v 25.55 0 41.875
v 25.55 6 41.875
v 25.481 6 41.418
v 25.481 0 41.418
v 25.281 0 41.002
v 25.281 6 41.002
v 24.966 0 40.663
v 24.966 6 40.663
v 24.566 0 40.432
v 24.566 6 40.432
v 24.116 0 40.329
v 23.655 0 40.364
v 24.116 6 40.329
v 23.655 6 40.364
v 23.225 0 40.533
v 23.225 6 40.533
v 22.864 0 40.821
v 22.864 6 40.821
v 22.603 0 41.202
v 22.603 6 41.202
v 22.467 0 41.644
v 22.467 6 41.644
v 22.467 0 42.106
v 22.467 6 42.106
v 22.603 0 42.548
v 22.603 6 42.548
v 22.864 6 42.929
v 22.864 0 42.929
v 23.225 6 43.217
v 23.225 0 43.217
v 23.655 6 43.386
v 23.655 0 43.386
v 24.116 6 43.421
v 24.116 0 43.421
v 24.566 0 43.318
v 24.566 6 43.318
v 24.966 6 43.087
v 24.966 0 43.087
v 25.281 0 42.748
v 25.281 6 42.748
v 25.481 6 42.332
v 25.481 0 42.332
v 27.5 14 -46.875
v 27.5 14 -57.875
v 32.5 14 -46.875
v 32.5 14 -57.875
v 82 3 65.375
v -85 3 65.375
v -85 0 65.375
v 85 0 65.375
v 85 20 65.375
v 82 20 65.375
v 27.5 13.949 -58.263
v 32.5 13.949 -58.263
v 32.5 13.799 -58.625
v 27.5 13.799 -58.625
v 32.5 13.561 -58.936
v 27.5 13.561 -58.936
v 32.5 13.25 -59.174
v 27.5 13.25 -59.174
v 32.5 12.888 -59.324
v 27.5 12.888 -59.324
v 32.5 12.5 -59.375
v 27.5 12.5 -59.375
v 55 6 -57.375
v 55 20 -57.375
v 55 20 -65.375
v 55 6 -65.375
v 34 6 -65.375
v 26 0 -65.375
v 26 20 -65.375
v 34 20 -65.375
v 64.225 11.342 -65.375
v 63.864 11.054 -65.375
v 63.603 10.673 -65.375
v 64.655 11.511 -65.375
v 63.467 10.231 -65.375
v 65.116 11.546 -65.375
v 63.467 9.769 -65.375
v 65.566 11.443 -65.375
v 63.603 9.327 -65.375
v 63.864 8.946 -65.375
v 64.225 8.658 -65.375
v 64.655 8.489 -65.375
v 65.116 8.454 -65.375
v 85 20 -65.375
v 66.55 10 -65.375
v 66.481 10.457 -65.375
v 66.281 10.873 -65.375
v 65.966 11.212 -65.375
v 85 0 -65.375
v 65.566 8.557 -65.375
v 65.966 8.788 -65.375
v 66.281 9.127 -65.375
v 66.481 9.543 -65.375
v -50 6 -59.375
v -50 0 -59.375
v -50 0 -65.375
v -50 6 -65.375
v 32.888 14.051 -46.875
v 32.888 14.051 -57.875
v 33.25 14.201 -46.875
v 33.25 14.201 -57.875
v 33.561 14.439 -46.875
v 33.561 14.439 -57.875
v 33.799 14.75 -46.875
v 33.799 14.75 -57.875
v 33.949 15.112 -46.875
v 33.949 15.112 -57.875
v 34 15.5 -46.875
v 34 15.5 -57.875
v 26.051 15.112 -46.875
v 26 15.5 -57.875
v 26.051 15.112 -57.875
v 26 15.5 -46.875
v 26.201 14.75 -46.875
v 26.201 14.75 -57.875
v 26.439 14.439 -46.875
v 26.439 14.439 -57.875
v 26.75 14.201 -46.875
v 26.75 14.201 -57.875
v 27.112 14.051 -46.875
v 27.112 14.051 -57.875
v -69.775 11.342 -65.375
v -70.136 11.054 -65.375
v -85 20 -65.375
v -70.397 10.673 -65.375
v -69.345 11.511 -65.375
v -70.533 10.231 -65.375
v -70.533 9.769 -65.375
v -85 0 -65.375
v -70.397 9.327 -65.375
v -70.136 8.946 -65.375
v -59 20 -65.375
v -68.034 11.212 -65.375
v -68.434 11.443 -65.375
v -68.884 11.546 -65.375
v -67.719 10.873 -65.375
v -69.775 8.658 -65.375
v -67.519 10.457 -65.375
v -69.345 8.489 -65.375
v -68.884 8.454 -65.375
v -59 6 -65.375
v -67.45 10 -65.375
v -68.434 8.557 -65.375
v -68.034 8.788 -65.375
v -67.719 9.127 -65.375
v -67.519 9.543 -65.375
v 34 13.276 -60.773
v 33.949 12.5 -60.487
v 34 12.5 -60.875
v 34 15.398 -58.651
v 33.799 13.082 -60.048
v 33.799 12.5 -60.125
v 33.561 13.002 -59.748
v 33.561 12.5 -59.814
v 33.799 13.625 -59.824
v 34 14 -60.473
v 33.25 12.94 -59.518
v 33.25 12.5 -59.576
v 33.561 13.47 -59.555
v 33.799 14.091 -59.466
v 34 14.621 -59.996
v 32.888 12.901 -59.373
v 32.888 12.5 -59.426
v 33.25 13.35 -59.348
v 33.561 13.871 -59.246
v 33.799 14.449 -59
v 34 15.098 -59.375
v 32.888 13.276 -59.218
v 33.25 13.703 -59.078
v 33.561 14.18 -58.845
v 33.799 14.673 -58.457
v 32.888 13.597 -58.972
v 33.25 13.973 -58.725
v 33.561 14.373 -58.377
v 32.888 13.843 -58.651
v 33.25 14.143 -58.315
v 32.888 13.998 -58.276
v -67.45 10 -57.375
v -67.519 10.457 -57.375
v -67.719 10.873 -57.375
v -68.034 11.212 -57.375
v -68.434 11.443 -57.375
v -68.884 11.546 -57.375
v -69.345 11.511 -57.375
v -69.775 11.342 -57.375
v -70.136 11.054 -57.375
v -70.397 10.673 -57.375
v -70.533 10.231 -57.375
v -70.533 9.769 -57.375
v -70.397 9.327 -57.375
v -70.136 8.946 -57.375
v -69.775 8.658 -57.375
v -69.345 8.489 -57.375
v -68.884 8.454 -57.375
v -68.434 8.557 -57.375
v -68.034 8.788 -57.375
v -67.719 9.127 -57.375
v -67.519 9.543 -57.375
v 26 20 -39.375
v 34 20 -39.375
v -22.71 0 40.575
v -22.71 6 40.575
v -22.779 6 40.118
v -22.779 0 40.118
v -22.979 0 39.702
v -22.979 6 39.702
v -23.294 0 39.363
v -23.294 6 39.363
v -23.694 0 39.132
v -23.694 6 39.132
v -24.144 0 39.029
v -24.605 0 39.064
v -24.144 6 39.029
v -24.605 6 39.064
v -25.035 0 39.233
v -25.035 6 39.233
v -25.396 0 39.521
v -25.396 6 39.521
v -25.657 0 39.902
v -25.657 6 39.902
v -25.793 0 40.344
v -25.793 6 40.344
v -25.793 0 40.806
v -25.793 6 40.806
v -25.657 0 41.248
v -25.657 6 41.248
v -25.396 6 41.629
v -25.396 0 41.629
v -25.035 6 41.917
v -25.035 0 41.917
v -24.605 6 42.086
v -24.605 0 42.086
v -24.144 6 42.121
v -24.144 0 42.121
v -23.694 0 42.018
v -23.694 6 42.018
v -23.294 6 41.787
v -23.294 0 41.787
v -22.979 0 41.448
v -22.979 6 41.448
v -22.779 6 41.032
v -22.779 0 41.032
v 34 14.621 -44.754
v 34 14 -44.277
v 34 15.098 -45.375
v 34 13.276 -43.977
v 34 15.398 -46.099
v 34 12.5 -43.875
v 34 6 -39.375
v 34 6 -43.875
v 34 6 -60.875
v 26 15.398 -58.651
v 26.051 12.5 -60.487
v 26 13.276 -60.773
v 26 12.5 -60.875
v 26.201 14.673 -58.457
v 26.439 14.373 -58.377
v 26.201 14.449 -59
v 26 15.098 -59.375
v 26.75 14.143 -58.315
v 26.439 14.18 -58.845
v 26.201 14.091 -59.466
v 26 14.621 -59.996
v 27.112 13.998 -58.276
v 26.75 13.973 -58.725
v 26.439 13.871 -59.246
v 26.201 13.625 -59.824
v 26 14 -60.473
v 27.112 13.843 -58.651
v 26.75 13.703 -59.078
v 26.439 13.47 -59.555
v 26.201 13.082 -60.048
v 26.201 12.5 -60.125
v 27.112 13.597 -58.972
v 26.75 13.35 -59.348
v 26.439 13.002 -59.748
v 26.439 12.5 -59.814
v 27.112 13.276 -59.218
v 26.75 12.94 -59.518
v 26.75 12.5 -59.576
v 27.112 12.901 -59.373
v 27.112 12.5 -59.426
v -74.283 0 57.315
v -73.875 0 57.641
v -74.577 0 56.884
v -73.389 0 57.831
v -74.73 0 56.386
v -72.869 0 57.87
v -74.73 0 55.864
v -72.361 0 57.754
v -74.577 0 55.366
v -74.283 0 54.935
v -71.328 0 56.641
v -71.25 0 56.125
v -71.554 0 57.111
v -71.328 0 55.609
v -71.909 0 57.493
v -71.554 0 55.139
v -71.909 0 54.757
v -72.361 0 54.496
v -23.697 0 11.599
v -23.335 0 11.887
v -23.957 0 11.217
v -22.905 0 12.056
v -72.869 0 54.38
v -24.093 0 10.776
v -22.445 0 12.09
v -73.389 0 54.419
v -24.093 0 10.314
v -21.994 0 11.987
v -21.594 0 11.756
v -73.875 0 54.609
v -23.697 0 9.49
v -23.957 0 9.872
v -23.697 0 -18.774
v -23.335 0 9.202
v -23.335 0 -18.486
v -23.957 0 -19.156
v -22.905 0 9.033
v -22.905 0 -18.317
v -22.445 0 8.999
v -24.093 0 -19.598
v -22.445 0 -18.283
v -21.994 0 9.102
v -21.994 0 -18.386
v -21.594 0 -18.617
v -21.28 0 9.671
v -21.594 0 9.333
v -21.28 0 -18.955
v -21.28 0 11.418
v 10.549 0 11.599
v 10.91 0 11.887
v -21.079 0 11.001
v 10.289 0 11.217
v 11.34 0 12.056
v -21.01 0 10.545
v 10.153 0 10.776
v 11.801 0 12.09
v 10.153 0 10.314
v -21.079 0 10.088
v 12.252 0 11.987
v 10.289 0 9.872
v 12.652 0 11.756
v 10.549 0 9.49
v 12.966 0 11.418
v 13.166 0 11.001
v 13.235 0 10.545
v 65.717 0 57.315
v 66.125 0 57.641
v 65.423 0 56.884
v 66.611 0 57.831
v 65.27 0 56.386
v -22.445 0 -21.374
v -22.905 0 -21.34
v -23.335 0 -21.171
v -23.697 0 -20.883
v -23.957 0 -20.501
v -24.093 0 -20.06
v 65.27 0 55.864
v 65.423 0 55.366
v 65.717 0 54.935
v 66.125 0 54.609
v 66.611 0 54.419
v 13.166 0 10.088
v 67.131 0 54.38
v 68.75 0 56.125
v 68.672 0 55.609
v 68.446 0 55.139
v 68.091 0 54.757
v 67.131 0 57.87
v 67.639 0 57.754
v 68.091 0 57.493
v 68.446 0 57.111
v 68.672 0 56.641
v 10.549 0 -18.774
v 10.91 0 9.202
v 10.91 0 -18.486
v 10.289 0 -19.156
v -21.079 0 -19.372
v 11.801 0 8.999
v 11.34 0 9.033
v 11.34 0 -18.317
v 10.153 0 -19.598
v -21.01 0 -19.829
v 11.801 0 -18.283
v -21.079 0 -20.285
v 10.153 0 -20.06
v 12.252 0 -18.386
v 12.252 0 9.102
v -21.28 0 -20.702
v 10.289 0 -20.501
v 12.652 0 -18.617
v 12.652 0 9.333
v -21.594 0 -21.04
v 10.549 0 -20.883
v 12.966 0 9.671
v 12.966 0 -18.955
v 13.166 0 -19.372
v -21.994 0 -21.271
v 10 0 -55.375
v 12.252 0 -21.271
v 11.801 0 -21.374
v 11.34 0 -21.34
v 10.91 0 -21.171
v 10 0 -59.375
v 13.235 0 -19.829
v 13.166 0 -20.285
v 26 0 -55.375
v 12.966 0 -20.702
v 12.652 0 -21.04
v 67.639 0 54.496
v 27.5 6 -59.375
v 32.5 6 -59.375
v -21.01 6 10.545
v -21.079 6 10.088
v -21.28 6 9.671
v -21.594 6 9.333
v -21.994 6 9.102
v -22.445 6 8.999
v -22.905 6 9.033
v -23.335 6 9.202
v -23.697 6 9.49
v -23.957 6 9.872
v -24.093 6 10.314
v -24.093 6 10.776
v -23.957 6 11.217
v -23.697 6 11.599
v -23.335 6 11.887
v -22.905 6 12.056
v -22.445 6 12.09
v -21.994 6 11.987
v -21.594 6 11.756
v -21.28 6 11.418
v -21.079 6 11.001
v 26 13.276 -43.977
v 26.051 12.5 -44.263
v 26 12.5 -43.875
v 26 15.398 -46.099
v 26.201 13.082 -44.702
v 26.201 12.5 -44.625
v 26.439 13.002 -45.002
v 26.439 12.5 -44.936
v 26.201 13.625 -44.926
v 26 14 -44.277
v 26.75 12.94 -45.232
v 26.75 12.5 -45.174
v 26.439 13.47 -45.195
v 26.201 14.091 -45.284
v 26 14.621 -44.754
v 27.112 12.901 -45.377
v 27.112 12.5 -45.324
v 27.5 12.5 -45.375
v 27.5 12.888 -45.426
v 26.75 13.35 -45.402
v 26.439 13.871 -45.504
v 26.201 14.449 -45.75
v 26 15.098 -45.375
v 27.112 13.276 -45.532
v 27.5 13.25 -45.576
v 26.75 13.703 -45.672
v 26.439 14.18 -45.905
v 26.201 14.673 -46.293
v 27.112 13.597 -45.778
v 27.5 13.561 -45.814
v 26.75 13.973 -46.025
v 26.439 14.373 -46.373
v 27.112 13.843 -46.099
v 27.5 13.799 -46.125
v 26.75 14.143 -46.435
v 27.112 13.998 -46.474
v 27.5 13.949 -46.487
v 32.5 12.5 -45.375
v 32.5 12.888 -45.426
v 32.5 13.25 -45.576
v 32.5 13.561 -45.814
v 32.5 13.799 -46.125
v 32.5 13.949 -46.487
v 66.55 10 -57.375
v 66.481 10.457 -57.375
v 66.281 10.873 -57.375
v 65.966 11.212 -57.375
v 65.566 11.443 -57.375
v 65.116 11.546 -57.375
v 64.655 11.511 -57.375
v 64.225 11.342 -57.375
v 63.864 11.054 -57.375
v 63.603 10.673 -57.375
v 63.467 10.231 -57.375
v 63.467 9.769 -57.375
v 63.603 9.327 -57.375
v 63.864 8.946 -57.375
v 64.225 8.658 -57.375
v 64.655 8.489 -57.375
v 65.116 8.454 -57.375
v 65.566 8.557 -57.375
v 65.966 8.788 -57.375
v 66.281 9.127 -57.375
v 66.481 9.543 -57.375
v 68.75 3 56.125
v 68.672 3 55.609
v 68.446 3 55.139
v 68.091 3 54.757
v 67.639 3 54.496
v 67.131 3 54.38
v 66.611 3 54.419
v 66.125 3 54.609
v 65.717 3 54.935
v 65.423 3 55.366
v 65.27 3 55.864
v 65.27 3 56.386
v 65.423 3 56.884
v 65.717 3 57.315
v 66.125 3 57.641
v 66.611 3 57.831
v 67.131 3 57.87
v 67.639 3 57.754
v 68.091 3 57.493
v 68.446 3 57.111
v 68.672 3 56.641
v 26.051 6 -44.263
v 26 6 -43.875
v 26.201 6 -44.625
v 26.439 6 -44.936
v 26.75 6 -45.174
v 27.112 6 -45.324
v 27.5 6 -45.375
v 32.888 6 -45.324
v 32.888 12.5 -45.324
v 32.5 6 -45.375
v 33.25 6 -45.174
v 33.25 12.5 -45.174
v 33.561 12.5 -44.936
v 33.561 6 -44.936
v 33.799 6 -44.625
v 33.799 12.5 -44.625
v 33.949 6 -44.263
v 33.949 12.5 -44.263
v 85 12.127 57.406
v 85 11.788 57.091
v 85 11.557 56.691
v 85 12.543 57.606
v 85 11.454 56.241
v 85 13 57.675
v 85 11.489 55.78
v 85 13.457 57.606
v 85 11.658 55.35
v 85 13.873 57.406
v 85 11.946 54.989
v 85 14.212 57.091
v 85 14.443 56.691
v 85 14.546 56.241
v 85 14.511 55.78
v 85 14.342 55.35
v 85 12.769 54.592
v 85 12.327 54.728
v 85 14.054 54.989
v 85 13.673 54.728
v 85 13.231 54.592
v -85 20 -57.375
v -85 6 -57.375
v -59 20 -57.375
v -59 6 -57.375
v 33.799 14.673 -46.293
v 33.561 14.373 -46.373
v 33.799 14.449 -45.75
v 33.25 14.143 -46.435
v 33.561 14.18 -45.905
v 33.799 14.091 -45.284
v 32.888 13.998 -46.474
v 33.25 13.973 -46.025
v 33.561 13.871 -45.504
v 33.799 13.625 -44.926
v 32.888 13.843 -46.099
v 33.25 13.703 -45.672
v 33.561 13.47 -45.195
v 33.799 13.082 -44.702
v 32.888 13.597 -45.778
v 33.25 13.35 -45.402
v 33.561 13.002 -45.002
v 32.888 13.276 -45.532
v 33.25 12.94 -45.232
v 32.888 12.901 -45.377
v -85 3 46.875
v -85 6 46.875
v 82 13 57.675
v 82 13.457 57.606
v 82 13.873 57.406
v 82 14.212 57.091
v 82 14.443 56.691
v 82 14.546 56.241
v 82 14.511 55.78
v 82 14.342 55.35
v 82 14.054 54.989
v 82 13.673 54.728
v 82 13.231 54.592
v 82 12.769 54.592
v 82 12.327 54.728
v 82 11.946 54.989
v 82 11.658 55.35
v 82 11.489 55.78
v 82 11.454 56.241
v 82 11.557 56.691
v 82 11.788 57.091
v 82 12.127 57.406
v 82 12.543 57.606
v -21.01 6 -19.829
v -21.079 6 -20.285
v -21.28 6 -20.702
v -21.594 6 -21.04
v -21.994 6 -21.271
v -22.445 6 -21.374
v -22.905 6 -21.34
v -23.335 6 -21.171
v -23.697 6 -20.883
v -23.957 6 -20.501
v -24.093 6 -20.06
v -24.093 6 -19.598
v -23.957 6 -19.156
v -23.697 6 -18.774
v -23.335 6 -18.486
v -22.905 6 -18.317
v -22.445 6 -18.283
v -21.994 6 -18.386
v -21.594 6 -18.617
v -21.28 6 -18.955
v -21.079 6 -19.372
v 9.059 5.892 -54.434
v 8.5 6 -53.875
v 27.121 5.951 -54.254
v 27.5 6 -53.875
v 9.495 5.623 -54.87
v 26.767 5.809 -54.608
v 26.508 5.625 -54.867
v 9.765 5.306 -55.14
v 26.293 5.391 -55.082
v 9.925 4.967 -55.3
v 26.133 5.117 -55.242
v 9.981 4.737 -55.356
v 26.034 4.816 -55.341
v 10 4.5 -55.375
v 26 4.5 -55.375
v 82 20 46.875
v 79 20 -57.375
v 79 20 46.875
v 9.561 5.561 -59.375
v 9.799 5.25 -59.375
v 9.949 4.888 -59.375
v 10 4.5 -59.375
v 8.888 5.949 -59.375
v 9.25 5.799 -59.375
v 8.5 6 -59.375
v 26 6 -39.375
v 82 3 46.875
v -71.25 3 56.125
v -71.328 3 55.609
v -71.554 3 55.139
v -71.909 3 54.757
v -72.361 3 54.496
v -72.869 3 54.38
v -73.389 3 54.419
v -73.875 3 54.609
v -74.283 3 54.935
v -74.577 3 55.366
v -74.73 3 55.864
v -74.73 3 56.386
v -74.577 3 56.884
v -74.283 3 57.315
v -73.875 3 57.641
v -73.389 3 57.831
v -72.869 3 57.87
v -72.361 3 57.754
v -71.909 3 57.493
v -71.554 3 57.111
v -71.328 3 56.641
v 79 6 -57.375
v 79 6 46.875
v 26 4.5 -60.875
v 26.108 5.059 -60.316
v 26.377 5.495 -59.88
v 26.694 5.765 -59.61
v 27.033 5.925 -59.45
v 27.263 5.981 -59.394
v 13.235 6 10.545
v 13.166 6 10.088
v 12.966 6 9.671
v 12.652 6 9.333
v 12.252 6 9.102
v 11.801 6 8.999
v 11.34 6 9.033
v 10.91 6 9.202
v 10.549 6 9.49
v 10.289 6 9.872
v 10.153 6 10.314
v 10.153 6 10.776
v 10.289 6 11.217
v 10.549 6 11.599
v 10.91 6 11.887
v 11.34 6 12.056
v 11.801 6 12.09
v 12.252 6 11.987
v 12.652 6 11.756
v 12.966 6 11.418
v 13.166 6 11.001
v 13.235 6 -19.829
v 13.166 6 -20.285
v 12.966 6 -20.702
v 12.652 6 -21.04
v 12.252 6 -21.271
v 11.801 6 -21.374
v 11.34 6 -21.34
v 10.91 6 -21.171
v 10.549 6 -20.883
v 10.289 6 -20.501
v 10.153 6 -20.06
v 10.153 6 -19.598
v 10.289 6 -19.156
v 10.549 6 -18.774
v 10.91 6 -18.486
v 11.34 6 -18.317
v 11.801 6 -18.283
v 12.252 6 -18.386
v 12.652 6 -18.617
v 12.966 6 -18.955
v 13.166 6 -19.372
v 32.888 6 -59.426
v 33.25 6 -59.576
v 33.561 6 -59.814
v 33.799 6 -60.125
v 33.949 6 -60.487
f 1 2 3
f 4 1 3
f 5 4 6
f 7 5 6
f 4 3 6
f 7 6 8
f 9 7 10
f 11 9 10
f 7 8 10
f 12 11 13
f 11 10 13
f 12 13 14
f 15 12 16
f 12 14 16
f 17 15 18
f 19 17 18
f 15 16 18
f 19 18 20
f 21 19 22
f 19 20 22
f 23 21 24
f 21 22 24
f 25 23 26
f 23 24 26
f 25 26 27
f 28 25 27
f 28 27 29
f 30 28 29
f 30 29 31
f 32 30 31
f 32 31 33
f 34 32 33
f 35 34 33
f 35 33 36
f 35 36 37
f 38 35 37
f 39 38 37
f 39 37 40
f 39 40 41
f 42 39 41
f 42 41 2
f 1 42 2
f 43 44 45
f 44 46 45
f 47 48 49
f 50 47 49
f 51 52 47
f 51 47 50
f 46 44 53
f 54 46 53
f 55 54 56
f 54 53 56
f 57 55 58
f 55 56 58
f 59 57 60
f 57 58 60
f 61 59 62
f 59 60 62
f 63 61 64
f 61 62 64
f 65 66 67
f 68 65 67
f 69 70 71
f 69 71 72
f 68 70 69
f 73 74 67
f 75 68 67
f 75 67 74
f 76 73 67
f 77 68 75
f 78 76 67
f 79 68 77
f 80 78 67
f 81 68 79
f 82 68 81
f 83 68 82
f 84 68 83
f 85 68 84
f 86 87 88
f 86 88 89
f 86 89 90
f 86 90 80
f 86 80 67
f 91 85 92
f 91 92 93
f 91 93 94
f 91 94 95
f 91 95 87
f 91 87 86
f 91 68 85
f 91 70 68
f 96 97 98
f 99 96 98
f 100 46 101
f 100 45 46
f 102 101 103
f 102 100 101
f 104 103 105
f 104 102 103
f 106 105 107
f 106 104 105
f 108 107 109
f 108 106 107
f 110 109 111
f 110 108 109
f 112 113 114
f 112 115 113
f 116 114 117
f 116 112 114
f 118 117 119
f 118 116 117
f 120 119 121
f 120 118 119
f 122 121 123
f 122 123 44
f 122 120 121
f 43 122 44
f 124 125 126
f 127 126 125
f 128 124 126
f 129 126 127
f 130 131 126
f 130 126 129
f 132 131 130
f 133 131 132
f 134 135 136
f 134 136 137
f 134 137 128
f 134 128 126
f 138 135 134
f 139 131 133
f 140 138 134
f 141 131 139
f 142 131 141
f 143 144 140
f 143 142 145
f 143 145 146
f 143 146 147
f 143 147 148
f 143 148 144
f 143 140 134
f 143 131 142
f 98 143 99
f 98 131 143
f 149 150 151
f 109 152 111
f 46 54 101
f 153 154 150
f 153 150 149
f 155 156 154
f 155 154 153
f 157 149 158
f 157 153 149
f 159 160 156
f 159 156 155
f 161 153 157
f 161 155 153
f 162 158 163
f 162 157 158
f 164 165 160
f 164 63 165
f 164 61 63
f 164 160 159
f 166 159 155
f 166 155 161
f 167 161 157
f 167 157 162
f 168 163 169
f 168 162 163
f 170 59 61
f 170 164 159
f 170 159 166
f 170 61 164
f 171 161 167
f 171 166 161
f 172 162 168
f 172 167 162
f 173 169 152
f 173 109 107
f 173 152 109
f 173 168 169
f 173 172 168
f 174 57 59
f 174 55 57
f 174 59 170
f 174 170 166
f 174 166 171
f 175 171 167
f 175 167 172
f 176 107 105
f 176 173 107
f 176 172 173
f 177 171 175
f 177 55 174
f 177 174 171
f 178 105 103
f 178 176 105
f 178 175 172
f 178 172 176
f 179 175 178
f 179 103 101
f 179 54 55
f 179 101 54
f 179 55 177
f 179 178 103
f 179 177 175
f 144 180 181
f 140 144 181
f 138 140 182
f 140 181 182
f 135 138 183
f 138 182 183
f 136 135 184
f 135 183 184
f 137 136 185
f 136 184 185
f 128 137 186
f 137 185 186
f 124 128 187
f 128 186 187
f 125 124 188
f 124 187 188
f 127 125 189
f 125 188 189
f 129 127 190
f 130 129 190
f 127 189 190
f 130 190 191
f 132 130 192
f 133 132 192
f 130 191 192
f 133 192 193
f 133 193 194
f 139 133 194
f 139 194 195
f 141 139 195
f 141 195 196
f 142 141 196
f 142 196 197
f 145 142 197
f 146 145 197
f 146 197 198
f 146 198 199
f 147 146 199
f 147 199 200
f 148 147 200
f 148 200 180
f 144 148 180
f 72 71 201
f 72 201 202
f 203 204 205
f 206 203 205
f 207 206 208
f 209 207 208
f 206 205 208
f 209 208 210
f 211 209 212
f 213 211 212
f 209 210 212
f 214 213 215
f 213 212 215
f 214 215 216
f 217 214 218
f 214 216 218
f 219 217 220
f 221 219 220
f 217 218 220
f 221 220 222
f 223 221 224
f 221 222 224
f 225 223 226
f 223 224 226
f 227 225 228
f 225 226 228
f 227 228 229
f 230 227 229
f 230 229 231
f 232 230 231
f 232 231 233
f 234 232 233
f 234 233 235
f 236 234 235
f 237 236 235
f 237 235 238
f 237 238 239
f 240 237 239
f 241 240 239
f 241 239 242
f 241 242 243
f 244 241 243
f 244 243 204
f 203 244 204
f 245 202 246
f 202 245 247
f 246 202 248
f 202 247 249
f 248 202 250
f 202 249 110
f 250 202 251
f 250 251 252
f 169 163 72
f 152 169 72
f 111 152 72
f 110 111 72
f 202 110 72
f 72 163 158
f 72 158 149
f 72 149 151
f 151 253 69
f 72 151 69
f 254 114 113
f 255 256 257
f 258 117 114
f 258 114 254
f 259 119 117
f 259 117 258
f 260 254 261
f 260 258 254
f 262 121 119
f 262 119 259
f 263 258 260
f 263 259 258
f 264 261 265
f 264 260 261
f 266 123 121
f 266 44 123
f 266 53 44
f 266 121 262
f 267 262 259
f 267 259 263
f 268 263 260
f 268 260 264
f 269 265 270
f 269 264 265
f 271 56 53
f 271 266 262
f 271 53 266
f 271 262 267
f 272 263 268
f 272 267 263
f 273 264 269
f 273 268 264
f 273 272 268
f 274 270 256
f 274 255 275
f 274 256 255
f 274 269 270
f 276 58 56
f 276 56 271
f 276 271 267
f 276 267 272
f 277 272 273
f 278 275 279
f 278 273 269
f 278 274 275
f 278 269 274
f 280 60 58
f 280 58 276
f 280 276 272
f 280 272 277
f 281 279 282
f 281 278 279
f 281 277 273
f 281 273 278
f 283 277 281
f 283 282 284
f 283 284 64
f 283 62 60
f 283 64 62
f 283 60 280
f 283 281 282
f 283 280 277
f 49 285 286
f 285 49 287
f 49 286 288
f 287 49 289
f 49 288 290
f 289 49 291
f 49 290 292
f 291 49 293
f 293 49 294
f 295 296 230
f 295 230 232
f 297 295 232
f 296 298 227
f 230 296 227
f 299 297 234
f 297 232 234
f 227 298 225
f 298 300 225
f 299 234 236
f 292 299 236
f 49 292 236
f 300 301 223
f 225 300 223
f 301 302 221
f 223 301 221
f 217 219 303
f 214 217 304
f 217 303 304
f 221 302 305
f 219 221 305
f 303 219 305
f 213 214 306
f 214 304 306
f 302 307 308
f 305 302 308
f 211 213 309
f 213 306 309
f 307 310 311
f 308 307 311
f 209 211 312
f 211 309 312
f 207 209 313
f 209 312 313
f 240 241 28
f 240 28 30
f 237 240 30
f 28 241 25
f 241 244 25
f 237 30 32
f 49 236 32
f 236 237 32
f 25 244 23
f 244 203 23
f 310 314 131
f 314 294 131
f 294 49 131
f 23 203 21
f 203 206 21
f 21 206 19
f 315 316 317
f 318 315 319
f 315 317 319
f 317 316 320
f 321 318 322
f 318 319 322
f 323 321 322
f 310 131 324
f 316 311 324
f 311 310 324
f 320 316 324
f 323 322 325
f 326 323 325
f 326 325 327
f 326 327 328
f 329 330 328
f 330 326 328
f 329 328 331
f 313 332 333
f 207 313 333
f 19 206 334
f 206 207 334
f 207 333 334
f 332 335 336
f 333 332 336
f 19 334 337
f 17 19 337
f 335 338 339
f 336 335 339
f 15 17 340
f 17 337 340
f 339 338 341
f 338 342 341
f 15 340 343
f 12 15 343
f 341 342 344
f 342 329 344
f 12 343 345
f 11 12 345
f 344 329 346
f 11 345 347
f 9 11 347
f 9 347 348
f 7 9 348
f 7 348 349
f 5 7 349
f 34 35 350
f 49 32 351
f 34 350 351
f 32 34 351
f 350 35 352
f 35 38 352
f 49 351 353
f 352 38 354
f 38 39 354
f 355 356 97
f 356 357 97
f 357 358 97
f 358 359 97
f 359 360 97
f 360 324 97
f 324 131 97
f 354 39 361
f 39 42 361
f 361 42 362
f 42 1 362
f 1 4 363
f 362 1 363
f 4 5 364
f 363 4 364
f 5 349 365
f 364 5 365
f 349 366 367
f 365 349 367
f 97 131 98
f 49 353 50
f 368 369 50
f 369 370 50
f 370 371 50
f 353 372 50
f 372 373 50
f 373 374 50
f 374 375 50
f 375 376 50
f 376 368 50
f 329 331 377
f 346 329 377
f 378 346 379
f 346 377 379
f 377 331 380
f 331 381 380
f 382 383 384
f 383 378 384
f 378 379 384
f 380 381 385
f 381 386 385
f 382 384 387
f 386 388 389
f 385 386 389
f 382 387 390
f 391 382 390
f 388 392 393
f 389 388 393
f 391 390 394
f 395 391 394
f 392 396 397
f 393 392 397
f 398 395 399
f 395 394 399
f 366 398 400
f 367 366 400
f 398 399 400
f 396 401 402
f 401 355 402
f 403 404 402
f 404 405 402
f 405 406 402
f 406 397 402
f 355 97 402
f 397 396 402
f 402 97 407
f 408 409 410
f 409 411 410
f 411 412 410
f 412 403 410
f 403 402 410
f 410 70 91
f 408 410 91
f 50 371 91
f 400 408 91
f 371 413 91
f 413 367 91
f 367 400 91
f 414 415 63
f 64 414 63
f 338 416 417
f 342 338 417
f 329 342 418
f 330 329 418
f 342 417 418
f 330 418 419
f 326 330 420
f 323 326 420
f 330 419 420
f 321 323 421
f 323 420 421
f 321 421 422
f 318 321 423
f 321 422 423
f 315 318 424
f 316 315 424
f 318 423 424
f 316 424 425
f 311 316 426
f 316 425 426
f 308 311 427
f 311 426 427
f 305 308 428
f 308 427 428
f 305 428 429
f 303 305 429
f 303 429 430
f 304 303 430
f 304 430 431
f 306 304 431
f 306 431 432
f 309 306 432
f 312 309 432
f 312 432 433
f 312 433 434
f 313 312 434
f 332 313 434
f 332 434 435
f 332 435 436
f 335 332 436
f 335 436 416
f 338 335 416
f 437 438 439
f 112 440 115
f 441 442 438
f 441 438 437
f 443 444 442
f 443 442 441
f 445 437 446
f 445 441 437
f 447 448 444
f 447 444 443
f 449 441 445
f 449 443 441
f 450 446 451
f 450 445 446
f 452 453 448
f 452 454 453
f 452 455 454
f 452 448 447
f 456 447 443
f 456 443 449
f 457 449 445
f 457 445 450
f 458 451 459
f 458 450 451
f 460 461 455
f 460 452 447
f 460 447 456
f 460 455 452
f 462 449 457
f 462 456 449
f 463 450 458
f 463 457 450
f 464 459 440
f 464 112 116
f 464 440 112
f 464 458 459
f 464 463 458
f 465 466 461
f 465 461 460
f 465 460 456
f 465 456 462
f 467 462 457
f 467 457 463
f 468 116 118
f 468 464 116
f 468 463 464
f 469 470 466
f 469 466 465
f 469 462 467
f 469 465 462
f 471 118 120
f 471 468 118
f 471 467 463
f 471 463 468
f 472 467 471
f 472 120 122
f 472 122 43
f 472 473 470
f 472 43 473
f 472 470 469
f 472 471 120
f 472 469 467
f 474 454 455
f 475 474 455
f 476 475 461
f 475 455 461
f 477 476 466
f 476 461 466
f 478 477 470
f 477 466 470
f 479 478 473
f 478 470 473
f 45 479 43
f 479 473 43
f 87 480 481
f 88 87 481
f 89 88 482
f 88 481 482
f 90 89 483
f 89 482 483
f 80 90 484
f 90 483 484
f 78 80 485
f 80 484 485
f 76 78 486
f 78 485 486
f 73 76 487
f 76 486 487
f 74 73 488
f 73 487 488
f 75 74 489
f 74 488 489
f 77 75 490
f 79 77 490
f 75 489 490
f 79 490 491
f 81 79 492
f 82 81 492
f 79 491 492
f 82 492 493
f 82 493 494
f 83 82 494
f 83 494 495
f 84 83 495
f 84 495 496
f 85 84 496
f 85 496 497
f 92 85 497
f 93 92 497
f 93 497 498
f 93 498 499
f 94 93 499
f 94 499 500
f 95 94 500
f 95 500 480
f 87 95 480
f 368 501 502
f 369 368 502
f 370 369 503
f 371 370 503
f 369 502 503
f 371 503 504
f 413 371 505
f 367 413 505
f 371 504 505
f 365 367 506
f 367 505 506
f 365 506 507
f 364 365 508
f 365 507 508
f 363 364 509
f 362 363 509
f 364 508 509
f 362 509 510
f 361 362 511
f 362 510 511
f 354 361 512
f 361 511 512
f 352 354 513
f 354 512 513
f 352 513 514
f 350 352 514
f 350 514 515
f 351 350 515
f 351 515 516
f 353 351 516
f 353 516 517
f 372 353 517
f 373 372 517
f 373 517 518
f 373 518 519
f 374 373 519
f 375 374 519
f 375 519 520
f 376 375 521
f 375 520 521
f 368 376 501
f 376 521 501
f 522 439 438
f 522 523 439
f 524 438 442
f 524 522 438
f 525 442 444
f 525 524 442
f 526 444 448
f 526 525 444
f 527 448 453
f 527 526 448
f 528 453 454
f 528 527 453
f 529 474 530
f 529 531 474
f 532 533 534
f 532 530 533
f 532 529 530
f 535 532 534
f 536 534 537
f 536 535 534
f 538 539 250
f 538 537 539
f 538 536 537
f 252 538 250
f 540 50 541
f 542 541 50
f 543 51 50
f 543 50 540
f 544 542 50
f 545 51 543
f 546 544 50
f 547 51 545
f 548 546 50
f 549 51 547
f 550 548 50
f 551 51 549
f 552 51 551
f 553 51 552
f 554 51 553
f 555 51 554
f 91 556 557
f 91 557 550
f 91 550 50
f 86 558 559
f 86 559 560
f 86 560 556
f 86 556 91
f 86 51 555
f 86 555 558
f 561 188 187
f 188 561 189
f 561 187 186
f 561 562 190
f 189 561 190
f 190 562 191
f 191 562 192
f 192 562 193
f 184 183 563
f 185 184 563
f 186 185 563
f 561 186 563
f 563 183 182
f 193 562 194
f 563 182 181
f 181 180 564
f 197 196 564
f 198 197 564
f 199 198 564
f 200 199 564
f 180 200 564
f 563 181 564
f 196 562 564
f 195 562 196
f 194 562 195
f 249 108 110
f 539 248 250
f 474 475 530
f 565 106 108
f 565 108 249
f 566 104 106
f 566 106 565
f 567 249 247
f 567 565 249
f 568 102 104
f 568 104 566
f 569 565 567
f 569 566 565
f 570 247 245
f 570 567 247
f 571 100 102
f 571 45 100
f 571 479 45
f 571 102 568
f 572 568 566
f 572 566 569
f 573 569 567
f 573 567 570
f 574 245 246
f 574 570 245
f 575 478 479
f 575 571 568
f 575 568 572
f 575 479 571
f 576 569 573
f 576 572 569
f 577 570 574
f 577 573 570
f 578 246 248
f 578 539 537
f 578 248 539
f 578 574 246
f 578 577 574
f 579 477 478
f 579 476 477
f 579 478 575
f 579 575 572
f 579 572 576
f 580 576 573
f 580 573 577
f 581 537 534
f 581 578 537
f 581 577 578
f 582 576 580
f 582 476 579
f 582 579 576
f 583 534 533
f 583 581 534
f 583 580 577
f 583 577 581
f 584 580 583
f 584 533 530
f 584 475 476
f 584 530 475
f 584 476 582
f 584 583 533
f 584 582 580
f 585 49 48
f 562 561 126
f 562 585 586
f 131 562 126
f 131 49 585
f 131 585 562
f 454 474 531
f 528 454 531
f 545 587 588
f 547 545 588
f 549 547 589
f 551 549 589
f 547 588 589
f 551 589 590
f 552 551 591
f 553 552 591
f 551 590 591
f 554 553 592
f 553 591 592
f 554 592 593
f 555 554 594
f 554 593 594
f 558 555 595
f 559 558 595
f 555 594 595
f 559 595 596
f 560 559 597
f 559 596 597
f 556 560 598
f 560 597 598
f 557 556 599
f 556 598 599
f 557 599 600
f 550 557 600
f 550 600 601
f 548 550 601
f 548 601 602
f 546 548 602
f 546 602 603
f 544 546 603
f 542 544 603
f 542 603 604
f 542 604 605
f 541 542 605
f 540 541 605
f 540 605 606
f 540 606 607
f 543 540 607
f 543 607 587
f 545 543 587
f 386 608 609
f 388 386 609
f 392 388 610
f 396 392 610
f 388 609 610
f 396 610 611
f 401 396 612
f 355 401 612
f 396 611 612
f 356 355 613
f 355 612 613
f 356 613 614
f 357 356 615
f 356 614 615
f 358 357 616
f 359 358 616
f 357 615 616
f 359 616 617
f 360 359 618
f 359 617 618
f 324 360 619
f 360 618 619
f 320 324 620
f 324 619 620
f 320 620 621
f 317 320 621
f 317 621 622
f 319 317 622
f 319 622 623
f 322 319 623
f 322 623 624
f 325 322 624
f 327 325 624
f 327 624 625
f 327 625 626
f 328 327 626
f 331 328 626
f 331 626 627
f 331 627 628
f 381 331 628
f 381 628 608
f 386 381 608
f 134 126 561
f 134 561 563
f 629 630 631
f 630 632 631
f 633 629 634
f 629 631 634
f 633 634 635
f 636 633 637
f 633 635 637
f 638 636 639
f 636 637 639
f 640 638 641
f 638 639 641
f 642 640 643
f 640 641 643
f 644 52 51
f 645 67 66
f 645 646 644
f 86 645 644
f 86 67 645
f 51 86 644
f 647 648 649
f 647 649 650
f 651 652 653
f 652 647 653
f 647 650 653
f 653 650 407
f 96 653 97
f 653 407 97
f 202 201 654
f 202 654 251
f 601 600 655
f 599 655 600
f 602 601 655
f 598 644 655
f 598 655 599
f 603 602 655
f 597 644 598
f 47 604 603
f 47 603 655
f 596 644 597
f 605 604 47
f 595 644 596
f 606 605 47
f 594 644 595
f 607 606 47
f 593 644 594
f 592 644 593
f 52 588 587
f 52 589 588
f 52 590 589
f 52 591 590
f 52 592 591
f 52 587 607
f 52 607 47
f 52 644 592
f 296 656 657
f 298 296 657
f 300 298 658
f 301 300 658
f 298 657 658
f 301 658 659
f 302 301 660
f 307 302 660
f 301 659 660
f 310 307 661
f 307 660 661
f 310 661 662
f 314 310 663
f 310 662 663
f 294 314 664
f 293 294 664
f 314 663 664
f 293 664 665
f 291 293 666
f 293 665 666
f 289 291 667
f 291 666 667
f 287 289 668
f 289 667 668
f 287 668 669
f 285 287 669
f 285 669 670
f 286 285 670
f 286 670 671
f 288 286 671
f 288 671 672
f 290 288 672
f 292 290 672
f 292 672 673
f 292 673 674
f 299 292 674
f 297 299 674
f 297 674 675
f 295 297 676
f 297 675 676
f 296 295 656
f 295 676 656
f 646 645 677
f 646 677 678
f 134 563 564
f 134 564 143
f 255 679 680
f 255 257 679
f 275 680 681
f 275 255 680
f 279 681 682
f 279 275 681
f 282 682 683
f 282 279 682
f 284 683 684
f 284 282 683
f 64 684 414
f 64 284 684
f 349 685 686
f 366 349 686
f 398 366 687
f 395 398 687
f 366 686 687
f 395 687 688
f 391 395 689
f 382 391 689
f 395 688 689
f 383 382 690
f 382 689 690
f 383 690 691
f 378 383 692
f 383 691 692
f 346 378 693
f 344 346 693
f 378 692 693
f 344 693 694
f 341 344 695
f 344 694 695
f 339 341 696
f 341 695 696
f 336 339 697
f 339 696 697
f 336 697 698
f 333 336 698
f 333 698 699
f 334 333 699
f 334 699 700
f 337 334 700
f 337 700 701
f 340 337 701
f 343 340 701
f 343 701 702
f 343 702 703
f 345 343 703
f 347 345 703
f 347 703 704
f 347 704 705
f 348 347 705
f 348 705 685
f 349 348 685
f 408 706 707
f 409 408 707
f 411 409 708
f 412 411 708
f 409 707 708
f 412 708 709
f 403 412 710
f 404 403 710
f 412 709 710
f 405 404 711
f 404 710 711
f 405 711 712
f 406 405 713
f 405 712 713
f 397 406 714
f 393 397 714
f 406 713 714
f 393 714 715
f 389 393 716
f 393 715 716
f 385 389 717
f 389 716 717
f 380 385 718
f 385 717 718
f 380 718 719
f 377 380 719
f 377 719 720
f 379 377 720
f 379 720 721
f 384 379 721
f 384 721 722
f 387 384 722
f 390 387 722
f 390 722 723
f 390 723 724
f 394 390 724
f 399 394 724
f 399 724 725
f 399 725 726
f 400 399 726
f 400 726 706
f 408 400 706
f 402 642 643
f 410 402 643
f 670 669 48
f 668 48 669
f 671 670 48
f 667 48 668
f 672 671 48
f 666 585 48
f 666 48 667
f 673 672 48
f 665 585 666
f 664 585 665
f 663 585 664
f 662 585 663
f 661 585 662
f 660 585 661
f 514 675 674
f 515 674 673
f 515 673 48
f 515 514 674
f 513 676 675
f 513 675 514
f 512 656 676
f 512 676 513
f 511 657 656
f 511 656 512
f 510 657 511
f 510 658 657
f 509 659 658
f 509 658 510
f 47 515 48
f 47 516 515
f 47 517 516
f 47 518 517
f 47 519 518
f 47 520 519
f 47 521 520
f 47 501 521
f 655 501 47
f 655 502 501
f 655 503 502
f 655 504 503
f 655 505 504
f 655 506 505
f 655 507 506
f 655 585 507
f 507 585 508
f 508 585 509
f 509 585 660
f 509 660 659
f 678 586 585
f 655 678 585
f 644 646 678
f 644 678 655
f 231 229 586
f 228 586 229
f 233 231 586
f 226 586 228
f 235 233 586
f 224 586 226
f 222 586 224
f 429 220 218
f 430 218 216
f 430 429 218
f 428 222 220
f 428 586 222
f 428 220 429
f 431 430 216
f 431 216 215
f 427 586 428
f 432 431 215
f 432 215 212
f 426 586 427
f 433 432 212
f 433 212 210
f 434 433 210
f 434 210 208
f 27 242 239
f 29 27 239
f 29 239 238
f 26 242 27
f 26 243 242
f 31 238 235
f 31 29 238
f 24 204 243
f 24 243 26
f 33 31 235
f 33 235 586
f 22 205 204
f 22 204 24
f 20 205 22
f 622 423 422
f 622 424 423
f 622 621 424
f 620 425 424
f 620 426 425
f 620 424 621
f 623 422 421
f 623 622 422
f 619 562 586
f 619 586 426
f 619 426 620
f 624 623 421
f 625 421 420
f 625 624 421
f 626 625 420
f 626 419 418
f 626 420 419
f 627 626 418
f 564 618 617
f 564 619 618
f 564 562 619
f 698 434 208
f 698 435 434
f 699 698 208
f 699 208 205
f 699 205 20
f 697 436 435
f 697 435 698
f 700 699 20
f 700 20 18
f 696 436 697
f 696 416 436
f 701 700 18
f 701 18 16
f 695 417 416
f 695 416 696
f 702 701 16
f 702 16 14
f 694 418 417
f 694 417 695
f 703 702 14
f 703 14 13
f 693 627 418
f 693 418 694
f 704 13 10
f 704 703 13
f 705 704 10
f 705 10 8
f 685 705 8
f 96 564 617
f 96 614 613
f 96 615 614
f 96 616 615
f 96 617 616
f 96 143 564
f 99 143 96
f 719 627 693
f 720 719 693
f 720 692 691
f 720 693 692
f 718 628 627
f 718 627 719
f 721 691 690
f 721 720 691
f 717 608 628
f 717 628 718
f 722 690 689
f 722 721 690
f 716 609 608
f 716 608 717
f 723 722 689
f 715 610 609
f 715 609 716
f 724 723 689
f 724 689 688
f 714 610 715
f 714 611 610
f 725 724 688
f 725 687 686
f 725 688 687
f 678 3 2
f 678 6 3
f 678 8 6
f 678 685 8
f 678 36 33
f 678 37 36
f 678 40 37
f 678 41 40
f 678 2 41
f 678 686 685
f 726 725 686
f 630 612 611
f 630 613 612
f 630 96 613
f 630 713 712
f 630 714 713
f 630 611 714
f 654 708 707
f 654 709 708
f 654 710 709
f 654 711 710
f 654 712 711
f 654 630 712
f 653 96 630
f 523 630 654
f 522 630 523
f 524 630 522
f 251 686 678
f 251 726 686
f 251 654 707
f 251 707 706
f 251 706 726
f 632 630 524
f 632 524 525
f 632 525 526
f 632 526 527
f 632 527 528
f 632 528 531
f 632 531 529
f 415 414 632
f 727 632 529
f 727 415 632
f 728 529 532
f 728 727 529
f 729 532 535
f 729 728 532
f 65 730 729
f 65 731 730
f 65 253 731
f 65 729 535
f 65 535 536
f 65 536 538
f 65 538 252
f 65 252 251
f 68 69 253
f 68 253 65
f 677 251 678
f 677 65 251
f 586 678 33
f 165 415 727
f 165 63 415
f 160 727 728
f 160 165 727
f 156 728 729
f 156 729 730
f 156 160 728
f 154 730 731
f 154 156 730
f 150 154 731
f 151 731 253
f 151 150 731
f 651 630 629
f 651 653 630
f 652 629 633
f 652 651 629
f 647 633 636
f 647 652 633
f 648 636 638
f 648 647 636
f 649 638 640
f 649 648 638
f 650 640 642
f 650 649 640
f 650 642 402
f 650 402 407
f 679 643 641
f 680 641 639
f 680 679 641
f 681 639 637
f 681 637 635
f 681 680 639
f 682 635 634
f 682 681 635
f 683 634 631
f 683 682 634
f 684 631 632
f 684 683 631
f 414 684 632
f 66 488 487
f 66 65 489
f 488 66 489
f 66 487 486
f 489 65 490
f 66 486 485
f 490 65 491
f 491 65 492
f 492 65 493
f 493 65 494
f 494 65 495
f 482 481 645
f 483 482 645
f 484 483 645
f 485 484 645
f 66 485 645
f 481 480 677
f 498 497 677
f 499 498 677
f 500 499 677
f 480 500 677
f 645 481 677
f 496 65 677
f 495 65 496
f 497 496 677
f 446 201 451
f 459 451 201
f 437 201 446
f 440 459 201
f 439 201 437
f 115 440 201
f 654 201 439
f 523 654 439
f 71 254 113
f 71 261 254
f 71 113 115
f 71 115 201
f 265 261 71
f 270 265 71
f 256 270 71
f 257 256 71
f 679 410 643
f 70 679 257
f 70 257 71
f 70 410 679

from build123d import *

# Parameters (mm, degrees)
BOSS_EXTRUDE1_DEPTH = 6
SKETCH2_W           = 26
SKETCH2_H           = 8
SKETCH2_W_2         = 30
BOSS_EXTRUDE2_DEPTH = 14
SKETCH3_R           = 1.55
CUT_EXTRUDE1_DEPTH  = 9
SKETCH4_W           = 170
SKETCH4_H           = 18.5
CUT_EXTRUDE2_DEPTH  = 3
SKETCH5_R           = 1.75
CUT_EXTRUDE3_DEPTH  = 3
BOSS_EXTRUDE3_REACH = 22
SKETCH8_R           = 1.55
CUT_EXTRUDE4_DEPTH  = 4
CUT_EXTRUDE5_REACH  = 8
SKETCH9_W           = 16
SKETCH9_H           = 10
SKETCH10_W          = 8
SKETCH10_H          = 26
BOSS_EXTRUDE4_DEPTH = 14
CUT_EXTRUDE6_REACH  = 121
FILLET1_R           = 1.5
SKETCH12_R          = 1.55
CUT_EXTRUDE7_DEPTH  = 14
CUT_EXTRUDE8_REACH  = 8
SKETCH13_R          = 1.55


with BuildPart() as part:
    # Sketch1 → Boss-Extrude1 (new body)
    with BuildSketch(Plane(origin=(0, 0, 0), x_dir=(1, 0, 0), z_dir=(0, 1, 0))):
        Polygon((-85, 65.375), (-85, -65.375), (85, -65.375), (85, 65.375), (10, 65.375), (10, 59.375), (-50, 59.375), (-50, 65.375), align=None)
    extrude(amount=BOSS_EXTRUDE1_DEPTH)

    # Sketch2 → Boss-Extrude2 (add)
    with BuildSketch(Plane(origin=(0, 6, 0), x_dir=(1, 0, 0), z_dir=(0, 1, 0))):
        with Locations((-72, 61.375)):
            Rectangle(SKETCH2_W, SKETCH2_H)
        with Locations((70, 61.375)):
            Rectangle(SKETCH2_W_2, SKETCH2_H)
    extrude(amount=BOSS_EXTRUDE2_DEPTH)

    # Sketch3 → Cut-Extrude1 (cut, through all)
    with BuildSketch(Plane.XY.offset(-57.375)):
        with Locations((-69, 10)):
            Circle(SKETCH3_R)
        with Locations((65, 10)):
            Circle(SKETCH3_R)
    extrude(amount=-CUT_EXTRUDE1_DEPTH, mode=Mode.SUBTRACT)

    # Sketch4 → Cut-Extrude2 (cut)
    with BuildSketch(Plane(origin=(0, 6, 0), x_dir=(1, 0, 0), z_dir=(0, 1, 0))):
        with Locations((0, -56.125)):
            Rectangle(SKETCH4_W, SKETCH4_H)
    extrude(amount=-CUT_EXTRUDE2_DEPTH, mode=Mode.SUBTRACT)

    # Sketch5 → Cut-Extrude3 (cut)
    with BuildSketch(Plane(origin=(0, 3, 0), x_dir=(1, 0, 0), z_dir=(0, 1, 0))):
        with Locations((-73, -56.125)):
            Circle(SKETCH5_R)
        with Locations((67, -56.125)):
            Circle(SKETCH5_R)
    extrude(amount=-CUT_EXTRUDE3_DEPTH, mode=Mode.SUBTRACT)

    # Sketch7 → Boss-Extrude3 (add, up to next)
    with BuildSketch(Plane(origin=(0, 20, 0), x_dir=(1, 0, 0), z_dir=(0, 1, 0)), mode=Mode.PRIVATE) as boss_extrude3_sk1:
        Polygon((85, -65.375), (85, 57.375), (79, 57.375), (79, -46.875), (82, -46.875), (82, -65.375), align=None)
    boss_extrude3_tool1 = extrude(boss_extrude3_sk1.sketch, amount=-BOSS_EXTRUDE3_REACH, mode=Mode.PRIVATE) - part.part
    add(boss_extrude3_tool1.solids().sort_by_distance((82.122247, 20, -0.248073))[0])

    # Sketch8 → Cut-Extrude4 (cut, through all)
    with BuildSketch(Plane.ZY.offset(-82)):
        with Locations((56.125, 13)):
            Circle(SKETCH8_R)
    extrude(amount=-CUT_EXTRUDE4_DEPTH, mode=Mode.SUBTRACT)

    # Sketch9 → Cut-Extrude5 (cut, up to next)
    with BuildSketch(Plane(origin=(0, 6, 0), x_dir=(1, 0, 0), z_dir=(0, 1, 0)), mode=Mode.PRIVATE) as cut_extrude5_sk1:
        with Locations((18, 60.375)):
            Rectangle(SKETCH9_W, SKETCH9_H)
    cut_extrude5_tool1 = extrude(cut_extrude5_sk1.sketch, amount=-CUT_EXTRUDE5_REACH, mode=Mode.PRIVATE) & part.part
    add(cut_extrude5_tool1.solids().sort_by_distance((18, 6, -60.375))[0], mode=Mode.SUBTRACT)

    # Sketch10 → Boss-Extrude4 (add)
    with BuildSketch(Plane(origin=(0, 6, 0), x_dir=(1, 0, 0), z_dir=(0, 1, 0))):
        with Locations((30, 52.375)):
            Rectangle(SKETCH10_W, SKETCH10_H)
    extrude(amount=BOSS_EXTRUDE4_DEPTH)

    # Sketch11 → Cut-Extrude6 (cut, up to next)
    with BuildSketch(Plane(origin=(34, 0, 0), x_dir=(0, 0, -1), z_dir=(1, 0, 0)), mode=Mode.PRIVATE) as cut_extrude6_sk1:
        Polygon((45.375, 12), (45.375, 6), (59.375, 6), (59.375, 12), (59.375, 14), (45.375, 14), align=None)
    cut_extrude6_tool1 = extrude(cut_extrude6_sk1.sketch, amount=-CUT_EXTRUDE6_REACH, mode=Mode.PRIVATE) & part.part
    add(cut_extrude6_tool1.solids().sort_by_distance((34, 10, -52.375))[0], mode=Mode.SUBTRACT)

    # Fillet1
    fillet1_edges = [part.edges().sort_by_distance(p)[0] for p in [
        (26, 6, -57.375),
        (18, 6, -55.375),
        (10, 6, -57.375),
        (26, 10, -45.375),
        (26, 14, -52.375),
        (26, 10, -59.375),
        (34, 10, -59.375),
        (34, 14, -52.375),
        (34, 10, -45.375),
        (30, 14, -45.375),
        (30, 14, -59.375),
    ]]
    fillet(fillet1_edges, radius=FILLET1_R)

    # Sketch12 → Cut-Extrude7 (cut)
    with BuildSketch(Plane(origin=(0, 6, 0), x_dir=(1, 0, 0), z_dir=(0, 1, 0))):
        with Locations((24, -41.875)):
            Circle(SKETCH12_R)
        with Locations((-24.26, -40.575)):
            Circle(SKETCH12_R)
    extrude(amount=-CUT_EXTRUDE7_DEPTH, mode=Mode.SUBTRACT)

    # Sketch13 → Cut-Extrude8 (cut, up to next)
    with BuildSketch(Plane(origin=(0, 6, 0), x_dir=(1, 0, 0), z_dir=(0, 1, 0)), mode=Mode.PRIVATE) as cut_extrude8_sk1:
        with Locations((11.685222517, 19.828524859)):
            Circle(SKETCH13_R)
    cut_extrude8_tool1 = extrude(cut_extrude8_sk1.sketch, amount=-CUT_EXTRUDE8_REACH, mode=Mode.PRIVATE) & part.part
    add(cut_extrude8_tool1.solids().sort_by_distance((11.685223, 6, -19.828525))[0], mode=Mode.SUBTRACT)
    # Sketch13 → Cut-Extrude8 (cut, up to next)
    with BuildSketch(Plane(origin=(0, 6, 0), x_dir=(1, 0, 0), z_dir=(0, 1, 0)), mode=Mode.PRIVATE) as cut_extrude8_sk2:
        with Locations((-22.560396417, 19.828524859)):
            Circle(SKETCH13_R)
    cut_extrude8_tool2 = extrude(cut_extrude8_sk2.sketch, amount=-CUT_EXTRUDE8_REACH, mode=Mode.PRIVATE) & part.part
    add(cut_extrude8_tool2.solids().sort_by_distance((-22.560396, 6, -19.828525))[0], mode=Mode.SUBTRACT)
    # Sketch13 → Cut-Extrude8 (cut, up to next)
    with BuildSketch(Plane(origin=(0, 6, 0), x_dir=(1, 0, 0), z_dir=(0, 1, 0)), mode=Mode.PRIVATE) as cut_extrude8_sk3:
        with Locations((11.685222517, -10.544533108)):
            Circle(SKETCH13_R)
    cut_extrude8_tool3 = extrude(cut_extrude8_sk3.sketch, amount=-CUT_EXTRUDE8_REACH, mode=Mode.PRIVATE) & part.part
    add(cut_extrude8_tool3.solids().sort_by_distance((11.685223, 6, 10.544533))[0], mode=Mode.SUBTRACT)
    # Sketch13 → Cut-Extrude8 (cut, up to next)
    with BuildSketch(Plane(origin=(0, 6, 0), x_dir=(1, 0, 0), z_dir=(0, 1, 0)), mode=Mode.PRIVATE) as cut_extrude8_sk4:
        with Locations((-22.560396417, -10.544533108)):
            Circle(SKETCH13_R)
    cut_extrude8_tool4 = extrude(cut_extrude8_sk4.sketch, amount=-CUT_EXTRUDE8_REACH, mode=Mode.PRIVATE) & part.part
    add(cut_extrude8_tool4.solids().sort_by_distance((-22.560396, 6, 10.544533))[0], mode=Mode.SUBTRACT)


solid = part.part
